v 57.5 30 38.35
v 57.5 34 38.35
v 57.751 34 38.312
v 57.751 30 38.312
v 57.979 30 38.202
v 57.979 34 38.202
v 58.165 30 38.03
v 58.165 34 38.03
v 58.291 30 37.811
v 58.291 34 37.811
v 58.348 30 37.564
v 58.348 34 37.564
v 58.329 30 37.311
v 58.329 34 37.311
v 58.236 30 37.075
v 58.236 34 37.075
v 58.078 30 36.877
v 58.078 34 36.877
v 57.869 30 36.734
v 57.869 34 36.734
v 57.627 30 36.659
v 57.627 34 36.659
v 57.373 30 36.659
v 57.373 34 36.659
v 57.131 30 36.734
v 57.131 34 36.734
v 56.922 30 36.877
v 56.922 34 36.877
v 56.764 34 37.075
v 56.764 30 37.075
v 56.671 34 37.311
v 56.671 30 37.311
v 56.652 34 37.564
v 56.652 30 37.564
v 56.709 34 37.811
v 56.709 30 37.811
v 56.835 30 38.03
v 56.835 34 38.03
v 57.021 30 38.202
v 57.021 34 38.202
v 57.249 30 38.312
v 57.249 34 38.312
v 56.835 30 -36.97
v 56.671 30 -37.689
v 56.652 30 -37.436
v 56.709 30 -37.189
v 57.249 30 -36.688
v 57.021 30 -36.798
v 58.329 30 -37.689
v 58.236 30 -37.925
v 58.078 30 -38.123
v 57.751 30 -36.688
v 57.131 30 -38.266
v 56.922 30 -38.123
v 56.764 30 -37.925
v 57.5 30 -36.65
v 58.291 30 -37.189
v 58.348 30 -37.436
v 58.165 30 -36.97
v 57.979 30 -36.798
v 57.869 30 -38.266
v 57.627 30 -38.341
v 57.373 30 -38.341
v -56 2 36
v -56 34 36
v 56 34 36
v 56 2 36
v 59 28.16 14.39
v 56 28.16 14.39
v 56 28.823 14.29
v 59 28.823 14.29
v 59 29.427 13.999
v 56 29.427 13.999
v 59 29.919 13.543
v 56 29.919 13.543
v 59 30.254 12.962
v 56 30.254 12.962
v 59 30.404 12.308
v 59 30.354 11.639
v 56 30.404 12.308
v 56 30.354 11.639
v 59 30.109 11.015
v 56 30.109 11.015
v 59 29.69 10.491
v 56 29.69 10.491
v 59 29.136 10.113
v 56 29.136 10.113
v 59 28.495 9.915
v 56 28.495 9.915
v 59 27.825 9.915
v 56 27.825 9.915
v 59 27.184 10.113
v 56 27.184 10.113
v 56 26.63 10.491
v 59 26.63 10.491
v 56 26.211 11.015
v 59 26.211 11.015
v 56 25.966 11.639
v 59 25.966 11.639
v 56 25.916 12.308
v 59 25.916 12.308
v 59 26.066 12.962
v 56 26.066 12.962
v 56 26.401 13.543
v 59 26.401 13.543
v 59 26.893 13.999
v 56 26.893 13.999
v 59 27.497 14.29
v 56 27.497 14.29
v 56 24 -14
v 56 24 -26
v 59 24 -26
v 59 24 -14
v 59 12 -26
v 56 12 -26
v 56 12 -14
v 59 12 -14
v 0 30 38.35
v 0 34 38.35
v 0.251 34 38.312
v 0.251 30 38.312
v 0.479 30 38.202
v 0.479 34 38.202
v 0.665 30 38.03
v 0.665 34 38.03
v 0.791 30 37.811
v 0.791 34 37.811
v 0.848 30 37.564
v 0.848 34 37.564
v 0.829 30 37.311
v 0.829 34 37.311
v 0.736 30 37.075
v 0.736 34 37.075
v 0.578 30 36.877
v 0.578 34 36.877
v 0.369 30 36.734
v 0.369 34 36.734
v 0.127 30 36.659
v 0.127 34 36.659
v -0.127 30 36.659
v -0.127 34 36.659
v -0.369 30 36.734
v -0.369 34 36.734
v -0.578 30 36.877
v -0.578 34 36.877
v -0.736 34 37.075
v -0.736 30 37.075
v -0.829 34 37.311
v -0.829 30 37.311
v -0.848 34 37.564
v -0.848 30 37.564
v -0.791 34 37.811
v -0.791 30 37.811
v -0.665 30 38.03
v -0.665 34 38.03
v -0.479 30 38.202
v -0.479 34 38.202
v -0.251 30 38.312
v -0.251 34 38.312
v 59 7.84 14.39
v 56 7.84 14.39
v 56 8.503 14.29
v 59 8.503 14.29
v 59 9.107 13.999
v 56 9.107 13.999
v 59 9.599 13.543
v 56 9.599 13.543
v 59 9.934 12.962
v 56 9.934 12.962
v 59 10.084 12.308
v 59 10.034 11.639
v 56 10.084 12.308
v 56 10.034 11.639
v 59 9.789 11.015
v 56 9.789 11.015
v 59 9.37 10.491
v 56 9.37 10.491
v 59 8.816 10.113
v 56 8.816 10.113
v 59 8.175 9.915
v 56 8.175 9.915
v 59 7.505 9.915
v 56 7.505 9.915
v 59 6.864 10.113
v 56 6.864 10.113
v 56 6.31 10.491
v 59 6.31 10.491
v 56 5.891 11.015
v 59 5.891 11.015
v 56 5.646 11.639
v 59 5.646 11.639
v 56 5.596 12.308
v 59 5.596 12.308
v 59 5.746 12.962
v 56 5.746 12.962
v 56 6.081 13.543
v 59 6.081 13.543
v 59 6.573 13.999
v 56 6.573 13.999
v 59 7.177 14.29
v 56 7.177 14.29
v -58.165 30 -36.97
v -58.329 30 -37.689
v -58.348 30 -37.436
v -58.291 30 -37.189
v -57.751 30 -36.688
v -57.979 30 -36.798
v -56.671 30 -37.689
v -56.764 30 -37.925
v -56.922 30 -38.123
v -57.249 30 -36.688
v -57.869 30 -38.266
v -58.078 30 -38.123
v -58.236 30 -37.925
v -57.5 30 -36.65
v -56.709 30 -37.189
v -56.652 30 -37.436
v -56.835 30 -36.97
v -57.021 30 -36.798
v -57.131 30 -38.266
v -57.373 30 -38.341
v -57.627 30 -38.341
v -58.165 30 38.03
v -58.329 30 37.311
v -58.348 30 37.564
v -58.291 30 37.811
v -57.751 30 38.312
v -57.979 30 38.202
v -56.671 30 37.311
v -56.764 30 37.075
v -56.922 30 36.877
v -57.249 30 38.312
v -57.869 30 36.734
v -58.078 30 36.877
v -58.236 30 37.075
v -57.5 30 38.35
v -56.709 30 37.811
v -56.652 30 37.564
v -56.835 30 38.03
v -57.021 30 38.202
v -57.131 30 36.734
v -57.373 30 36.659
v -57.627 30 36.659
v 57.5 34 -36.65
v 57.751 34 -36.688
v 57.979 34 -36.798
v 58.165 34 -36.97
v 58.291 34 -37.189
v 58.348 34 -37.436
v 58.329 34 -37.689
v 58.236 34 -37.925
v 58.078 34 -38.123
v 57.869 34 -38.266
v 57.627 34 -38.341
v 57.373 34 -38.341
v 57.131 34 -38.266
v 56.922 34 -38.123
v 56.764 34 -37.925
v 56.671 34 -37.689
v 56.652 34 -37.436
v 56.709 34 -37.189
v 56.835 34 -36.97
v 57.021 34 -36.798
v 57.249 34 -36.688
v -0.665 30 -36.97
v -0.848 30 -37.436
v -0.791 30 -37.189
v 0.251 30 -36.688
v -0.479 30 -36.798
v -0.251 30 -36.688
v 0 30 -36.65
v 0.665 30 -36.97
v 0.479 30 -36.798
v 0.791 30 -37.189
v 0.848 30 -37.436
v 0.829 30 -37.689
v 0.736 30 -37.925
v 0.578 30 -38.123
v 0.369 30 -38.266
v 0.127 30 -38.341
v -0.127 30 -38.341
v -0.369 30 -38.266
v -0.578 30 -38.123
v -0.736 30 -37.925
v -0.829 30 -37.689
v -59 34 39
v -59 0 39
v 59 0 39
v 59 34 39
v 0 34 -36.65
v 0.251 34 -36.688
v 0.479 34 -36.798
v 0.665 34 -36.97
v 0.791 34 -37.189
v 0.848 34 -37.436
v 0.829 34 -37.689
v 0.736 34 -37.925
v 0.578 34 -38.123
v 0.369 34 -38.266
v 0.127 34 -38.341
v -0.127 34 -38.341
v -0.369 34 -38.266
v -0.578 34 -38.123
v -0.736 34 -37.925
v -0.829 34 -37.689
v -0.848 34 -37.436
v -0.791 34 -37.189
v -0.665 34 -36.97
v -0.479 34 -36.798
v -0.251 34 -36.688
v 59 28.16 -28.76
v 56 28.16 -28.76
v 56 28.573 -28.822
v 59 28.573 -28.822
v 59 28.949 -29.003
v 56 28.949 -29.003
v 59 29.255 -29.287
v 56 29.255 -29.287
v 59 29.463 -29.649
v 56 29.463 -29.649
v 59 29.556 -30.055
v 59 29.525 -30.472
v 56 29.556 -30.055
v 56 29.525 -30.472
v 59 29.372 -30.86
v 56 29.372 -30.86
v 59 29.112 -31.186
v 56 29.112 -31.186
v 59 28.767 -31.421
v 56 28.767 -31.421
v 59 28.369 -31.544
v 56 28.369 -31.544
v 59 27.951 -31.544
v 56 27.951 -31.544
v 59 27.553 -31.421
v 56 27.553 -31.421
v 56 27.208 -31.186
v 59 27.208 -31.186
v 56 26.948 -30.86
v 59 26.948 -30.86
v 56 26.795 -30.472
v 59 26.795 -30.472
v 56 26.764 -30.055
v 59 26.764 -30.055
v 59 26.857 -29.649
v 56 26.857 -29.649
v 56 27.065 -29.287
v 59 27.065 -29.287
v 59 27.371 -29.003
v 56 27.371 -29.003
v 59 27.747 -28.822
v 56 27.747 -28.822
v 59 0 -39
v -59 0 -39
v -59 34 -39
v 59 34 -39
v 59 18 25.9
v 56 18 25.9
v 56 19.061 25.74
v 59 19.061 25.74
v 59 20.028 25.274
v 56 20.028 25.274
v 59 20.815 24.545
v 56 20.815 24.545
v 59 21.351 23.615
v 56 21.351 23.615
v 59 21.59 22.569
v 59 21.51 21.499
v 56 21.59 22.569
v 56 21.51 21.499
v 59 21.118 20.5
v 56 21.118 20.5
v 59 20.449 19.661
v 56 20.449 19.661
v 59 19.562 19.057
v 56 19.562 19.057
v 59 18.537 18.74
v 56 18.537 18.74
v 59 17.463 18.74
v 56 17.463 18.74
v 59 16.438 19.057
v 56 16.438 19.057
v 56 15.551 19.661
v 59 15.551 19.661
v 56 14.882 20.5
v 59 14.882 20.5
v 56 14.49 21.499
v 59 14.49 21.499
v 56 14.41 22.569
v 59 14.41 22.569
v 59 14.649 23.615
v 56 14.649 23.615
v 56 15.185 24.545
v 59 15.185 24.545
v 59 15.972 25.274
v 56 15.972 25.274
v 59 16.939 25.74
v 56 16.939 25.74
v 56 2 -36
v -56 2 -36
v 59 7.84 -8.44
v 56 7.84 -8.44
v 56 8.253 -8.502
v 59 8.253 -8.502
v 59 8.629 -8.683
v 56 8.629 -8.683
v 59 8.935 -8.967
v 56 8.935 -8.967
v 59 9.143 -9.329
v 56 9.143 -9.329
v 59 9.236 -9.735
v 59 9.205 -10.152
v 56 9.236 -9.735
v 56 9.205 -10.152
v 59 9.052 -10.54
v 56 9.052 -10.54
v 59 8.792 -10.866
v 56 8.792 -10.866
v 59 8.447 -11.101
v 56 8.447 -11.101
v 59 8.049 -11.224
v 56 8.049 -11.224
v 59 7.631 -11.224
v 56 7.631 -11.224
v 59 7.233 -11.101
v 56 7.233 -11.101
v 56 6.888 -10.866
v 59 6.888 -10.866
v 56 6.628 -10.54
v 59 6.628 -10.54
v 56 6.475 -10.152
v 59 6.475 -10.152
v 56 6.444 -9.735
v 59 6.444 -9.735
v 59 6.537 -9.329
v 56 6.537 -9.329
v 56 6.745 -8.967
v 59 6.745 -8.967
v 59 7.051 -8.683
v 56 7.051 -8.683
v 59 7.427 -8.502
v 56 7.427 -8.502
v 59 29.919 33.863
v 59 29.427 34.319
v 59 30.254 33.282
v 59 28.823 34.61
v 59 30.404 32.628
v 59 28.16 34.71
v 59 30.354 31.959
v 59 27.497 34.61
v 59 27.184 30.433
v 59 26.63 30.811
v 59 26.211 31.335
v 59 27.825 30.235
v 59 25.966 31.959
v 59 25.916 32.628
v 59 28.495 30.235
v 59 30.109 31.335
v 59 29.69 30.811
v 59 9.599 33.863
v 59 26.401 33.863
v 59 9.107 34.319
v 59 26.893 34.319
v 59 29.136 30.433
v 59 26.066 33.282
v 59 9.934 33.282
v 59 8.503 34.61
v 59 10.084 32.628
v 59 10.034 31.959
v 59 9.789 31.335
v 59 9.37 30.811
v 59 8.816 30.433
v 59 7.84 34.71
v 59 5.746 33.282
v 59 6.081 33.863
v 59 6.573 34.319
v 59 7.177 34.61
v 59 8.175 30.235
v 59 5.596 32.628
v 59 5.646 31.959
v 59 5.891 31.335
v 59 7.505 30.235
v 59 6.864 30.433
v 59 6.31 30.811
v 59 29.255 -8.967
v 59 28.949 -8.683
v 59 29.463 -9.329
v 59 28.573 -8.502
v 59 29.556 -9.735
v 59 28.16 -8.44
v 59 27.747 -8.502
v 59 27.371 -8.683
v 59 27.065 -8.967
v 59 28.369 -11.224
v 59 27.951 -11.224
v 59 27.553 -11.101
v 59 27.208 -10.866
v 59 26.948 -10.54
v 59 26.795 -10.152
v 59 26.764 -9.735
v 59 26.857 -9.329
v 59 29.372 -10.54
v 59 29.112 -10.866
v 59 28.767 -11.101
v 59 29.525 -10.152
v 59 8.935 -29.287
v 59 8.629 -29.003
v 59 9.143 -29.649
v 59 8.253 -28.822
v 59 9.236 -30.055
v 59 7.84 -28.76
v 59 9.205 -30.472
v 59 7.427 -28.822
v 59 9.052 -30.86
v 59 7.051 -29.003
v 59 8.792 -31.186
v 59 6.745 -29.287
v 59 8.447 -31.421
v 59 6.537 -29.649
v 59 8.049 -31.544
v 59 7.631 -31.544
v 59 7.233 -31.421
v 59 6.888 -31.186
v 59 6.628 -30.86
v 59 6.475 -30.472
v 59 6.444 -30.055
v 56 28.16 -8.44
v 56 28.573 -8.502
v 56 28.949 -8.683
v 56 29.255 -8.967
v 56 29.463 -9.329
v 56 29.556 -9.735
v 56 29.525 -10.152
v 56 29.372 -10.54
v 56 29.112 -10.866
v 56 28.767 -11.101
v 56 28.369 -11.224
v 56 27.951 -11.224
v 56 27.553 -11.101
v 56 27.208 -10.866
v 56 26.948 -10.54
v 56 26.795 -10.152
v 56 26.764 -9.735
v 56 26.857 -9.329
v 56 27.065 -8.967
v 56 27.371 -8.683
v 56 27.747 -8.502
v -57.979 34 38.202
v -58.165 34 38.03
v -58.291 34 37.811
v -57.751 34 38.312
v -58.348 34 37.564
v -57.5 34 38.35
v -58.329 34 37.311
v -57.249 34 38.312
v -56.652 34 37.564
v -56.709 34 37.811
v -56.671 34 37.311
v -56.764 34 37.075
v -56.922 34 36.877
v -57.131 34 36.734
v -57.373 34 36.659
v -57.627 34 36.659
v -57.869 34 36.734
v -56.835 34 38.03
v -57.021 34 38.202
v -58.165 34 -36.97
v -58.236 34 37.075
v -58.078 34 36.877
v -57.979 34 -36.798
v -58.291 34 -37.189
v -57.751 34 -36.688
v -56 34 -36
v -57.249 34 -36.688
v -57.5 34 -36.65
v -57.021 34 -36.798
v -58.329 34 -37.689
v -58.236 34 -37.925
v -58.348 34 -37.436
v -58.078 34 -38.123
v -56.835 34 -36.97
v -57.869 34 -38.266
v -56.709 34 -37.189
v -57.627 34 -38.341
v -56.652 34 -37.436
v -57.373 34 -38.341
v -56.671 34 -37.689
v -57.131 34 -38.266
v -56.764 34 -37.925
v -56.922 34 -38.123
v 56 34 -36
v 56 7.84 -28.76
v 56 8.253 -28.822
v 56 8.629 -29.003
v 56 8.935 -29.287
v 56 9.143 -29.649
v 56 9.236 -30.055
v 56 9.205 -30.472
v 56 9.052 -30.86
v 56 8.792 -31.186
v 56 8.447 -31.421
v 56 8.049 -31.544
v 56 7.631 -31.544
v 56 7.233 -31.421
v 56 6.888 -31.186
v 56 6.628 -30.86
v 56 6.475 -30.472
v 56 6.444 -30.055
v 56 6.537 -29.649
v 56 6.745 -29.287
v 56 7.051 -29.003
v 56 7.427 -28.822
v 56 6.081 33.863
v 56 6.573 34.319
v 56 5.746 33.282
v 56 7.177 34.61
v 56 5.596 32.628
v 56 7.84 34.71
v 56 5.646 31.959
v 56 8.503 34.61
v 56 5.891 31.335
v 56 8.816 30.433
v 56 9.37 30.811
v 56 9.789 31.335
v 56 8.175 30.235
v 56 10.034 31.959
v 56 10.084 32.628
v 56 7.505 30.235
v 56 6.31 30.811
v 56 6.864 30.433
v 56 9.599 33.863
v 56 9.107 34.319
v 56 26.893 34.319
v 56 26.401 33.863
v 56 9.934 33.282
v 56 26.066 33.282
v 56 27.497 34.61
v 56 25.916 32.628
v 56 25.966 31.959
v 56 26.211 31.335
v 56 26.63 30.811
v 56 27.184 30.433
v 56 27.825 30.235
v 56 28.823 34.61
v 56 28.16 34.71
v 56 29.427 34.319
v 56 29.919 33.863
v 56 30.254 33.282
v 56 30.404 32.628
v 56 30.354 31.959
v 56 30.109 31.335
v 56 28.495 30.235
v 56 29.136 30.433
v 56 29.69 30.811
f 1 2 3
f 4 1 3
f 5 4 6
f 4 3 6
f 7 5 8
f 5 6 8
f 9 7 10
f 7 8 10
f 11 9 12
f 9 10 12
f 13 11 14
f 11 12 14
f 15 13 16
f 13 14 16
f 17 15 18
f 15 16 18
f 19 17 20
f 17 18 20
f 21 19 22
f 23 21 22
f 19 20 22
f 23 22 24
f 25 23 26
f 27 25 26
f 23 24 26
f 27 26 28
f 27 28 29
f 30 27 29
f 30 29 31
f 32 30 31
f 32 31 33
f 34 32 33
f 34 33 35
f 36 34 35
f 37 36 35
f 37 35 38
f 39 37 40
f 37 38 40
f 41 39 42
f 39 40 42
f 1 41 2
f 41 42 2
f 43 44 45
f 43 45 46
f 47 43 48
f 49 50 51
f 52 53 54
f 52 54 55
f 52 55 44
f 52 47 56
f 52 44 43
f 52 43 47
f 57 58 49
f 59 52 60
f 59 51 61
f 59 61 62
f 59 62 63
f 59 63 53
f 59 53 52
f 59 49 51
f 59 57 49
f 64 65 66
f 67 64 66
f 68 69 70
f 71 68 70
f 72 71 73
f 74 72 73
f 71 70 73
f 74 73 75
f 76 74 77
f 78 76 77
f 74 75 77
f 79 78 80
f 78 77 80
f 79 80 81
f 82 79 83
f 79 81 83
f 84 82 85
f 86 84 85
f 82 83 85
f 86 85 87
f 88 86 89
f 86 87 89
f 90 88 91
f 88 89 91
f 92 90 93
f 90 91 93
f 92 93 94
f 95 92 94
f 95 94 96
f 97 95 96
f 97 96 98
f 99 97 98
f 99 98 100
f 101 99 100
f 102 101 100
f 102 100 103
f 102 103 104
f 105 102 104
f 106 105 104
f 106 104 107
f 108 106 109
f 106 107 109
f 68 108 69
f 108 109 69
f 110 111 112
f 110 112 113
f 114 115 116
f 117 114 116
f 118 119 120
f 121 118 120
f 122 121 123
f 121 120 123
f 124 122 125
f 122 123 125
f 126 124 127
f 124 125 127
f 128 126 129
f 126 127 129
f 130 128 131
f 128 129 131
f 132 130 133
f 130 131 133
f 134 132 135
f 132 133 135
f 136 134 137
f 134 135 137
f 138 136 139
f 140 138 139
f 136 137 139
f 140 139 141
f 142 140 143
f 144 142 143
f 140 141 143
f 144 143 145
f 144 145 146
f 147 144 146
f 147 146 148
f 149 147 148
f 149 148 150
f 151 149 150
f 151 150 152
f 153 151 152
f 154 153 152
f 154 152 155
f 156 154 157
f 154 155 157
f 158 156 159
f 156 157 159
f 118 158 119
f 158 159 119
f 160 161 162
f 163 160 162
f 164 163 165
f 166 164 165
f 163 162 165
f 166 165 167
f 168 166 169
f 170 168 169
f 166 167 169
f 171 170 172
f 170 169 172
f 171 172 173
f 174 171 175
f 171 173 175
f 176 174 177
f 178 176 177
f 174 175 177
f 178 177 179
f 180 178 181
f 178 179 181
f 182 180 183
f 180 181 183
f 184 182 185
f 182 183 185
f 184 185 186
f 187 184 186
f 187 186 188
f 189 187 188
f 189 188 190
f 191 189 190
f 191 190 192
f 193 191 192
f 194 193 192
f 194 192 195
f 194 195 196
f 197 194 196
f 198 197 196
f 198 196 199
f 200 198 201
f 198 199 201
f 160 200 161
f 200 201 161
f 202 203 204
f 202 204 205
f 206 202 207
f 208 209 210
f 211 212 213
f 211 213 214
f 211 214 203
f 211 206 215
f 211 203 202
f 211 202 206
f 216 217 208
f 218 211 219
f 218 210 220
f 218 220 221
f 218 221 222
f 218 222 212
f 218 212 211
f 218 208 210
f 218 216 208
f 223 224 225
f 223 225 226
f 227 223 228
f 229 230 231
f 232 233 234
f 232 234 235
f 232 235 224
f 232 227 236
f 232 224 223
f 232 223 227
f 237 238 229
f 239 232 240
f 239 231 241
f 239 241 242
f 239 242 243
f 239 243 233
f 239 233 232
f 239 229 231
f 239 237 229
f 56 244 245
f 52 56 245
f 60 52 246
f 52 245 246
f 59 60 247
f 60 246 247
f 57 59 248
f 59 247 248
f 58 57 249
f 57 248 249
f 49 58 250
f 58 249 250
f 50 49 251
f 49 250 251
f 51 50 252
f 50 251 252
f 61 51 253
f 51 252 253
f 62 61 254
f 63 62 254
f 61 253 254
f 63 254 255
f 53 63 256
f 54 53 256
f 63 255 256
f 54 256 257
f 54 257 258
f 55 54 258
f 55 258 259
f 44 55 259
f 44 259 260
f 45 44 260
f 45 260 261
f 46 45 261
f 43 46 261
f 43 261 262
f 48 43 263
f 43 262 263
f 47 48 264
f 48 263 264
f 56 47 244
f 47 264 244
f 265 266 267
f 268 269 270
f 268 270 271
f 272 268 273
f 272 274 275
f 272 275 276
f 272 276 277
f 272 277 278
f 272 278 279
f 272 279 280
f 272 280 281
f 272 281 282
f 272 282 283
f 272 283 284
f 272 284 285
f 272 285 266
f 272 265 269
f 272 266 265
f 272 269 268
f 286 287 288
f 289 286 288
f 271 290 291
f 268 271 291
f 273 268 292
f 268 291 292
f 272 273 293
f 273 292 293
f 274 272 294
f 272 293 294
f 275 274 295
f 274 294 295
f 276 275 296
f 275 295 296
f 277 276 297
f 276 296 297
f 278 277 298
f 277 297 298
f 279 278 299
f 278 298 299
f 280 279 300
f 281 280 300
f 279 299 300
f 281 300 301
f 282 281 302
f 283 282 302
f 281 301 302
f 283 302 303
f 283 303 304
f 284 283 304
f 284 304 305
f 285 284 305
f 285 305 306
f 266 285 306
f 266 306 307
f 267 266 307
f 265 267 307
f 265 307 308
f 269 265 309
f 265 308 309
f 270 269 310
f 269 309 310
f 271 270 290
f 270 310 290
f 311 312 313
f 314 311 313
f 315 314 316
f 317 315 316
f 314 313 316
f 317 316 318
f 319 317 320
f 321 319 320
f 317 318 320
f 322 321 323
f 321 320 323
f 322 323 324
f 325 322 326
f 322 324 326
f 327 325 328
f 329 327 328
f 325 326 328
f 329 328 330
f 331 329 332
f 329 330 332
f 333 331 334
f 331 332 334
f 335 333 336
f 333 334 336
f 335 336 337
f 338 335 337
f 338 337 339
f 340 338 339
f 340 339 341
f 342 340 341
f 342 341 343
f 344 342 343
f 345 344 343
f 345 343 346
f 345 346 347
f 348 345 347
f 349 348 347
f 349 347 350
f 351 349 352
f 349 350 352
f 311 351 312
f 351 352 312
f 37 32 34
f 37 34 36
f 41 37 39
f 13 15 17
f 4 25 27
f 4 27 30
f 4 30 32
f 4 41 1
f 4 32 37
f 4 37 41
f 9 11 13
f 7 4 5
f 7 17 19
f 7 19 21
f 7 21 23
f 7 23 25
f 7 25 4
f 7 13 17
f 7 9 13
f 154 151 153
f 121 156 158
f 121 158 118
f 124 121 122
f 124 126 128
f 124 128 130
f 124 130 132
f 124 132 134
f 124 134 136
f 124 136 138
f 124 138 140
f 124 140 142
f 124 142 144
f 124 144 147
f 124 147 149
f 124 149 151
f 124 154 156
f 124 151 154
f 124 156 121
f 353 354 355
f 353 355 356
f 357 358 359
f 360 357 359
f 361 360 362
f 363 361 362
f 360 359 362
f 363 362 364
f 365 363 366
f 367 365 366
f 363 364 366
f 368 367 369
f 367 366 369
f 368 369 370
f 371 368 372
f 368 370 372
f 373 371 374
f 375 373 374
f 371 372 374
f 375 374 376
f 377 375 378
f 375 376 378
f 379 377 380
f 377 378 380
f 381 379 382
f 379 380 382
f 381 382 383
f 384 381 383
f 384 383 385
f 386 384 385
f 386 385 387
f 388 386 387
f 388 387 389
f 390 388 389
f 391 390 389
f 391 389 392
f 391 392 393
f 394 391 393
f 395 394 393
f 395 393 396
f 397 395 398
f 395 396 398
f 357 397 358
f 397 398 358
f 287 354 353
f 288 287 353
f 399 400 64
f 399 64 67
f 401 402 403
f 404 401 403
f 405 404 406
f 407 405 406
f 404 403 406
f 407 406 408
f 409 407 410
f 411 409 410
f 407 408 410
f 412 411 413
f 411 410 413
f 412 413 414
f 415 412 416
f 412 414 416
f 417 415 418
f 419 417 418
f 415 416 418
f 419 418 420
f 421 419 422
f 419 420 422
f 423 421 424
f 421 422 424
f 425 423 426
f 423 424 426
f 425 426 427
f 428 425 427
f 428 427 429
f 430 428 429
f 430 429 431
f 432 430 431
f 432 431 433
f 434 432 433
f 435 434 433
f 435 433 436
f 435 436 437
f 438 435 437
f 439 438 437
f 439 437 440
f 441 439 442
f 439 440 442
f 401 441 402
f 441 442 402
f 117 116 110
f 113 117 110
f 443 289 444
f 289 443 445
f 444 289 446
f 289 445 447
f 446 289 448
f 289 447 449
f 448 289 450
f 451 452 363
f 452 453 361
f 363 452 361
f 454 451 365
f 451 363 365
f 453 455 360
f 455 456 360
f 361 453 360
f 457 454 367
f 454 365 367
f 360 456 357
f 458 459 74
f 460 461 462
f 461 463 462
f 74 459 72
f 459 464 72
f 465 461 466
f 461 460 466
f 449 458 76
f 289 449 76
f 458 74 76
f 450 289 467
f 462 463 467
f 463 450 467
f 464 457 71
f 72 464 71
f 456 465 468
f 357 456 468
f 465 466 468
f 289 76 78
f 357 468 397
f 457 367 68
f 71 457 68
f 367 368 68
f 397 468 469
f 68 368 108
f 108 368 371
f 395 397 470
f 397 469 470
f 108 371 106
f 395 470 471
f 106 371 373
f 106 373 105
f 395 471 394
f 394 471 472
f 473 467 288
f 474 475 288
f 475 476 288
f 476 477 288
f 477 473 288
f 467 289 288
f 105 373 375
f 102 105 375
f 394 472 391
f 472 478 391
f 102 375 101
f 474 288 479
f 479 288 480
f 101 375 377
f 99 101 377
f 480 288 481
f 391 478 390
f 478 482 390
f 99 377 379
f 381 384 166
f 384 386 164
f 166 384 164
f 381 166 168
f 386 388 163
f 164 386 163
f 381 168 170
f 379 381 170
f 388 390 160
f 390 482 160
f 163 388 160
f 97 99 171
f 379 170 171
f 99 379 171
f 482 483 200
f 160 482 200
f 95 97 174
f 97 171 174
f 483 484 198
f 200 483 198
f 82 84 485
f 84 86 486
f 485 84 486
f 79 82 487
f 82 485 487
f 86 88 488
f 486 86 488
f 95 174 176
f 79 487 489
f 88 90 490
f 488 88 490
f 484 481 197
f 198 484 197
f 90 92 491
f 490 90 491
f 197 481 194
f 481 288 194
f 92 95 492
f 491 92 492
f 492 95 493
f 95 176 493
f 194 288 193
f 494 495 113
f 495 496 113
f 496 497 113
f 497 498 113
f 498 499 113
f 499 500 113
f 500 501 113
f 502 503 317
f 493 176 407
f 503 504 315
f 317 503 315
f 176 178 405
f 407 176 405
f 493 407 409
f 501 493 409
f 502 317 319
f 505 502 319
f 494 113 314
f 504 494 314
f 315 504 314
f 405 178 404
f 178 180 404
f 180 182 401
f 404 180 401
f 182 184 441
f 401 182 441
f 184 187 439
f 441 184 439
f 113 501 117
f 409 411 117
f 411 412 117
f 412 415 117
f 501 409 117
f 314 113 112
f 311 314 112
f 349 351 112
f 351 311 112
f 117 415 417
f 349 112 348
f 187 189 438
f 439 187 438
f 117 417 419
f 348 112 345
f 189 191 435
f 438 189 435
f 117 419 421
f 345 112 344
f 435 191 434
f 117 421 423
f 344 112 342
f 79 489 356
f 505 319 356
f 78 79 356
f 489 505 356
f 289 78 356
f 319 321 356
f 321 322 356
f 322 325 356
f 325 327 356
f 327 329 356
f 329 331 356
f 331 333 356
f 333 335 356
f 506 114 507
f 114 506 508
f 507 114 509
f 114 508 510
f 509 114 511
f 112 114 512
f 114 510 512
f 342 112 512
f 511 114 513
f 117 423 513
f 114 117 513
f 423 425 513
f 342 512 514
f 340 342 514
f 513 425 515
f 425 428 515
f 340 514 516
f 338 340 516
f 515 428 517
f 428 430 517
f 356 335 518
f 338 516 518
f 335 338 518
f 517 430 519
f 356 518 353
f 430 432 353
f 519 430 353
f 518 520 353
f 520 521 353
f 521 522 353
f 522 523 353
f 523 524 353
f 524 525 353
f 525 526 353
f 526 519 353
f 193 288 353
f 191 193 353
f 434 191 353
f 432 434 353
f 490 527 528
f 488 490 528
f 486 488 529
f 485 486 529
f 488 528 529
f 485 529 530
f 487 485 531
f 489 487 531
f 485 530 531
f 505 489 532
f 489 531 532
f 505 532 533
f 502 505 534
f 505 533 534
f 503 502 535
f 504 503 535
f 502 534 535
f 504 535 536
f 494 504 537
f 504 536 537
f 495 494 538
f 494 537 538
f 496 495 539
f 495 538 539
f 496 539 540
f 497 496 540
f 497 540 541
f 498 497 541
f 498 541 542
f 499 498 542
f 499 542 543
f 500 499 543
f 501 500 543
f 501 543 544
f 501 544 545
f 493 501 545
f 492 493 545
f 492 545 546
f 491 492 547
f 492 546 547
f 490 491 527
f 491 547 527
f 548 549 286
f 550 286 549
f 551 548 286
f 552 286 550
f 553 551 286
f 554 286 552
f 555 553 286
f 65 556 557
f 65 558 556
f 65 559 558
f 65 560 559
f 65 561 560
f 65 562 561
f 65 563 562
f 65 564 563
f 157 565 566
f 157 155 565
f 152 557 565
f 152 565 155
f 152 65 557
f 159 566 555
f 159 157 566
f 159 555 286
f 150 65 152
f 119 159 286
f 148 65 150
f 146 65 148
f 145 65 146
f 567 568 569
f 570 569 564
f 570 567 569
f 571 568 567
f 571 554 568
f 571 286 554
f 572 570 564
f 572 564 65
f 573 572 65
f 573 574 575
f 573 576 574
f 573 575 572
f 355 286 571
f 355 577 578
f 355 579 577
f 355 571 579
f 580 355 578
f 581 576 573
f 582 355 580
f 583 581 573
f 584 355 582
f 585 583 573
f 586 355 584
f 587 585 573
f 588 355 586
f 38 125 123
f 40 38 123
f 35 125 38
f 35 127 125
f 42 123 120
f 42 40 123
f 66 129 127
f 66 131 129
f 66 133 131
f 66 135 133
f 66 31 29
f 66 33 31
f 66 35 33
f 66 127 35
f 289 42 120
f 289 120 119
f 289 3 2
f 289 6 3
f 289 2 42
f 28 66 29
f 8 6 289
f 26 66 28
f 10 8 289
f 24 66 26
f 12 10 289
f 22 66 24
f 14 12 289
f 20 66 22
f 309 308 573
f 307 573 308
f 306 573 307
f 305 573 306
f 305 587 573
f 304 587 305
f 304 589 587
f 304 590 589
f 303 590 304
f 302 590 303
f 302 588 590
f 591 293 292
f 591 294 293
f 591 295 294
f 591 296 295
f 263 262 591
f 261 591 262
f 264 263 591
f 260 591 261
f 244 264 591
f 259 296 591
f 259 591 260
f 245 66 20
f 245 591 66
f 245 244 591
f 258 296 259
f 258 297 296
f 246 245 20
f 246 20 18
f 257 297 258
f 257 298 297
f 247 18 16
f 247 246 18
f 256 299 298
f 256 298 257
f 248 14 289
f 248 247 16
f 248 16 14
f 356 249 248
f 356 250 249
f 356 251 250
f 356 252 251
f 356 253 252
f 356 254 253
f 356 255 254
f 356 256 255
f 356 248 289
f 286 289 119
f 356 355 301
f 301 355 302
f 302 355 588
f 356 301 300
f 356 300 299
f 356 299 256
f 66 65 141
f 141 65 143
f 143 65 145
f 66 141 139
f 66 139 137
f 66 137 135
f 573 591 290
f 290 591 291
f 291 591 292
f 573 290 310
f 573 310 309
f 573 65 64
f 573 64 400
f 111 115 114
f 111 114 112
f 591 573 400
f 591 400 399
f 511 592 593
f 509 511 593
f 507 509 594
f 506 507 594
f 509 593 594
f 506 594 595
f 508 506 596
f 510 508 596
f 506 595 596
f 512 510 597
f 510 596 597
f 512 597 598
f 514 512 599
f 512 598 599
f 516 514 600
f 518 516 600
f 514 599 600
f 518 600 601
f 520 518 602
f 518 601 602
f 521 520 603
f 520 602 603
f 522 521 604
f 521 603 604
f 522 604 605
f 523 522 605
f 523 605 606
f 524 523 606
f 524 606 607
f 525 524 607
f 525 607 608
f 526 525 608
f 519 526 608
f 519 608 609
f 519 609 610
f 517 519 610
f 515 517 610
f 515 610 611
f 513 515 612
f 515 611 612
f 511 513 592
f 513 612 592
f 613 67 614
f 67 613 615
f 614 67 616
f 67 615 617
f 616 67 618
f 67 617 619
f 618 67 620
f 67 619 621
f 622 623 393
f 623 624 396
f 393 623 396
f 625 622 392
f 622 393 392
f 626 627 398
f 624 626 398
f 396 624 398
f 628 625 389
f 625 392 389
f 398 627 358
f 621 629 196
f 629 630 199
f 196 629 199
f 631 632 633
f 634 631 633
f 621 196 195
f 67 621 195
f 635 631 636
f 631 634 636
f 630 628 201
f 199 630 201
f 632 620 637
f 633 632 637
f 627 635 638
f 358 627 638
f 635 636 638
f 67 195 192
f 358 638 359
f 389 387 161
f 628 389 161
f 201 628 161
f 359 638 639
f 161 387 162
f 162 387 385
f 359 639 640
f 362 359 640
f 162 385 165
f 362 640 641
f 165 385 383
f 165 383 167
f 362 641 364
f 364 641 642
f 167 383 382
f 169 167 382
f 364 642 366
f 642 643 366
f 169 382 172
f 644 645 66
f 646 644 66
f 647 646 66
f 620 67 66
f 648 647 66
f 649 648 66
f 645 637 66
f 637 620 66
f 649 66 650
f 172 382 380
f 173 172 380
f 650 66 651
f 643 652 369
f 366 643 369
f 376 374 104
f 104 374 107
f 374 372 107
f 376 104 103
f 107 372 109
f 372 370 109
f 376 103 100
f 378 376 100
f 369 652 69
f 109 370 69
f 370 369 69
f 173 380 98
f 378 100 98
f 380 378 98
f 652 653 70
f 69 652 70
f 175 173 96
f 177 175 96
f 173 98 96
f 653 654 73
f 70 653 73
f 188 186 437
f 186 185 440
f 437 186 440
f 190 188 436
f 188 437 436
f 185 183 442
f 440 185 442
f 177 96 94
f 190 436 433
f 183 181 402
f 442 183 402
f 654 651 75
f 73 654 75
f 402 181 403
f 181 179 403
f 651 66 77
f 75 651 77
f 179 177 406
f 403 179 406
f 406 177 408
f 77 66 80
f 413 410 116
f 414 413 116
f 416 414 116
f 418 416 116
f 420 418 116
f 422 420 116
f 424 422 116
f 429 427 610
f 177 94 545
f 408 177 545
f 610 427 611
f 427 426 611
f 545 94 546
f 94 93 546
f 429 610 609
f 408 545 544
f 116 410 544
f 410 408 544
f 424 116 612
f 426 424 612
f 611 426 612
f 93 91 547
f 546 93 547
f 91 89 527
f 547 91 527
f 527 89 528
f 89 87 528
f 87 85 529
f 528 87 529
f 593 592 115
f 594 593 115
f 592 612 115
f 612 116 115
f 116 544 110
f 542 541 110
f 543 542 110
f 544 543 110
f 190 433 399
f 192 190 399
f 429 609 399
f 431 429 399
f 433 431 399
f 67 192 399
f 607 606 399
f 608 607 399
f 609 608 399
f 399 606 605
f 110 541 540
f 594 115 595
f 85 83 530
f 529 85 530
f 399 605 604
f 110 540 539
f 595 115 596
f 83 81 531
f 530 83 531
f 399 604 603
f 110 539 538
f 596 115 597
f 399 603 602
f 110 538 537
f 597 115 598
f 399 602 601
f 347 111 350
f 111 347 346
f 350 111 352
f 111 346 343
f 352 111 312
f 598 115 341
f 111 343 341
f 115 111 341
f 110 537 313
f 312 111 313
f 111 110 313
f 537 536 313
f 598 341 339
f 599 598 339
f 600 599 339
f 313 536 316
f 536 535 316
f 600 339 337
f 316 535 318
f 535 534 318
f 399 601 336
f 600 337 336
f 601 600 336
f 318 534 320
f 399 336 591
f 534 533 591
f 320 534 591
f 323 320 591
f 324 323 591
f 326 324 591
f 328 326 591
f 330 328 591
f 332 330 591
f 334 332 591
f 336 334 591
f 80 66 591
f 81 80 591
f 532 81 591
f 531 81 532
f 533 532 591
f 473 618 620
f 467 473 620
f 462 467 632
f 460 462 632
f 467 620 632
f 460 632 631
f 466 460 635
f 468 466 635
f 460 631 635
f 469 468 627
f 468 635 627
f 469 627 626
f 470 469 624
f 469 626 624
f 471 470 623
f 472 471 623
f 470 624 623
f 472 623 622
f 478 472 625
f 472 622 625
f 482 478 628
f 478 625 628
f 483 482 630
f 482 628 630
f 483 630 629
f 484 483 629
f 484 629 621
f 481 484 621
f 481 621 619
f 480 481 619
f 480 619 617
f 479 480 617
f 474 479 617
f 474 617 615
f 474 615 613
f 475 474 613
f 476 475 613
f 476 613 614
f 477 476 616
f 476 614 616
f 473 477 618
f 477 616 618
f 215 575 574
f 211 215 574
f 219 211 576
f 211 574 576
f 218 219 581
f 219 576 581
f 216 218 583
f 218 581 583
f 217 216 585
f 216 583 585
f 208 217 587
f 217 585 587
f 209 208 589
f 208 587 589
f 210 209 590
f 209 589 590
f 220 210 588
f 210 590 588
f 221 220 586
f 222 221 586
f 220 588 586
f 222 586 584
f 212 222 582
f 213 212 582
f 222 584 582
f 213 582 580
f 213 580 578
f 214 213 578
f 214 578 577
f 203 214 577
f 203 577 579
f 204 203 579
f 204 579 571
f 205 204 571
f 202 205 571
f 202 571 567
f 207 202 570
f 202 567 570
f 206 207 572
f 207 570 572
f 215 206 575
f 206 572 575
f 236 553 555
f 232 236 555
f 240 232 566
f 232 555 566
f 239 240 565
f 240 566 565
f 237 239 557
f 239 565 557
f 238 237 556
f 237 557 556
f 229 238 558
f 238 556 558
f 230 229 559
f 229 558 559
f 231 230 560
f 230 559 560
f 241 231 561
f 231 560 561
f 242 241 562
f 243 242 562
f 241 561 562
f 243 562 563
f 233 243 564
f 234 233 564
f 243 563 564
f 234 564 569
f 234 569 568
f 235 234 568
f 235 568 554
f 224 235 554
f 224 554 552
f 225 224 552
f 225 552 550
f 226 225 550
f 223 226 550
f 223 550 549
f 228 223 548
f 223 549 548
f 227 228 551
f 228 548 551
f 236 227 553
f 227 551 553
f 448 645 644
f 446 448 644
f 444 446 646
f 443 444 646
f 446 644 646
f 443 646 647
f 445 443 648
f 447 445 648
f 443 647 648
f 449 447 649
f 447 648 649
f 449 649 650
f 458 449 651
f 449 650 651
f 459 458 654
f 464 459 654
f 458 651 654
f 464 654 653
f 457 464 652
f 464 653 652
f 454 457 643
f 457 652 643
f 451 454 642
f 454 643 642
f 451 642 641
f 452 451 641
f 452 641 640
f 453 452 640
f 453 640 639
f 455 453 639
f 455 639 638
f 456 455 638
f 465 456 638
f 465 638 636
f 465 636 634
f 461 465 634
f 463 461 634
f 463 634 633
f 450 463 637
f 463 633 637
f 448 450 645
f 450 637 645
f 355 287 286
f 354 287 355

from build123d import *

# Parameters (mm, degrees)
SKETCH1_W           = 118
SKETCH1_H           = 78
MAIN_BOX_UP_DEPTH   = 34
SKETCH2_W           = 112
SKETCH2_H           = 72
MAIN_BOX_INTO_DEPTH = 32
SKETCH4_R           = 1.4
SKETCH4_W           = 12
SKETCH4_H           = 12
GPS_DEPTH           = 3
SKETCH5_R           = 2.25
SKETCH5_R_2         = 3.6
CUT_EXTRUDE3_DEPTH  = 3
SKETCH6_R           = 0.85
CUT_EXTRUDE4_DEPTH  = 4


with BuildPart() as part:
    # Sketch1 → Main Box Up (new body)
    with BuildSketch(Plane(origin=(0, 0, 0), x_dir=(1, 0, 0), z_dir=(0, 1, 0))):
        Rectangle(SKETCH1_W, SKETCH1_H)
    extrude(amount=MAIN_BOX_UP_DEPTH)

    # Sketch2 → Main Box Into (cut)
    with BuildSketch(Plane(origin=(0, 34, 0), x_dir=(1, 0, 0), z_dir=(0, 1, 0))):
        Rectangle(SKETCH2_W, SKETCH2_H)
    extrude(amount=-MAIN_BOX_INTO_DEPTH, mode=Mode.SUBTRACT)

    # Sketch4 → GPS (cut)
    with BuildSketch(Plane.ZY.offset(-56)):
        with Locations((-30.16, 28.16)):
            Circle(SKETCH4_R)
        with Locations((-9.84, 28.16)):
            Circle(SKETCH4_R)
        with Locations((-30.16, 7.84)):
            Circle(SKETCH4_R)
        with Locations((-9.84, 7.84)):
            Circle(SKETCH4_R)
        with Locations((-20, 18)):
            Rectangle(SKETCH4_W, SKETCH4_H)
    extrude(amount=-GPS_DEPTH, mode=Mode.SUBTRACT)

    # Sketch5 → Cut-Extrude3 (cut)
    with BuildSketch(Plane.ZY.offset(-56)):
        with Locations((12.14, 28.16)):
            Circle(SKETCH5_R)
        with Locations((32.46, 28.16)):
            Circle(SKETCH5_R)
        with Locations((12.14, 7.84)):
            Circle(SKETCH5_R)
        with Locations((32.46, 7.84)):
            Circle(SKETCH5_R)
        with Locations((22.3, 18)):
            Circle(SKETCH5_R_2)
    extrude(amount=-CUT_EXTRUDE3_DEPTH, mode=Mode.SUBTRACT)

    # Sketch6 → Cut-Extrude4 (cut)
    with BuildSketch(Plane(origin=(0, 34, 0), x_dir=(1, 0, 0), z_dir=(0, 1, 0))):
        with Locations(Location((-57.5, 37.5, 0), (0, 0, 270))):
            Circle(SKETCH6_R)
        with Locations(Location((-57.5, -37.5, 0), (0, 0, 270))):
            Circle(SKETCH6_R)
        with Locations(Location((57.5, -37.5, 0), (0, 0, 270))):
            Circle(SKETCH6_R)
        with Locations(Location((57.5, 37.5, 0), (0, 0, 270))):
            Circle(SKETCH6_R)
        with Locations(Location((0, 37.5, 0), (0, 0, 270))):
            Circle(SKETCH6_R)
        with Locations(Location((0, -37.5, 0), (0, 0, 270))):
            Circle(SKETCH6_R)
    extrude(amount=-CUT_EXTRUDE4_DEPTH, mode=Mode.SUBTRACT)


solid = part.part
